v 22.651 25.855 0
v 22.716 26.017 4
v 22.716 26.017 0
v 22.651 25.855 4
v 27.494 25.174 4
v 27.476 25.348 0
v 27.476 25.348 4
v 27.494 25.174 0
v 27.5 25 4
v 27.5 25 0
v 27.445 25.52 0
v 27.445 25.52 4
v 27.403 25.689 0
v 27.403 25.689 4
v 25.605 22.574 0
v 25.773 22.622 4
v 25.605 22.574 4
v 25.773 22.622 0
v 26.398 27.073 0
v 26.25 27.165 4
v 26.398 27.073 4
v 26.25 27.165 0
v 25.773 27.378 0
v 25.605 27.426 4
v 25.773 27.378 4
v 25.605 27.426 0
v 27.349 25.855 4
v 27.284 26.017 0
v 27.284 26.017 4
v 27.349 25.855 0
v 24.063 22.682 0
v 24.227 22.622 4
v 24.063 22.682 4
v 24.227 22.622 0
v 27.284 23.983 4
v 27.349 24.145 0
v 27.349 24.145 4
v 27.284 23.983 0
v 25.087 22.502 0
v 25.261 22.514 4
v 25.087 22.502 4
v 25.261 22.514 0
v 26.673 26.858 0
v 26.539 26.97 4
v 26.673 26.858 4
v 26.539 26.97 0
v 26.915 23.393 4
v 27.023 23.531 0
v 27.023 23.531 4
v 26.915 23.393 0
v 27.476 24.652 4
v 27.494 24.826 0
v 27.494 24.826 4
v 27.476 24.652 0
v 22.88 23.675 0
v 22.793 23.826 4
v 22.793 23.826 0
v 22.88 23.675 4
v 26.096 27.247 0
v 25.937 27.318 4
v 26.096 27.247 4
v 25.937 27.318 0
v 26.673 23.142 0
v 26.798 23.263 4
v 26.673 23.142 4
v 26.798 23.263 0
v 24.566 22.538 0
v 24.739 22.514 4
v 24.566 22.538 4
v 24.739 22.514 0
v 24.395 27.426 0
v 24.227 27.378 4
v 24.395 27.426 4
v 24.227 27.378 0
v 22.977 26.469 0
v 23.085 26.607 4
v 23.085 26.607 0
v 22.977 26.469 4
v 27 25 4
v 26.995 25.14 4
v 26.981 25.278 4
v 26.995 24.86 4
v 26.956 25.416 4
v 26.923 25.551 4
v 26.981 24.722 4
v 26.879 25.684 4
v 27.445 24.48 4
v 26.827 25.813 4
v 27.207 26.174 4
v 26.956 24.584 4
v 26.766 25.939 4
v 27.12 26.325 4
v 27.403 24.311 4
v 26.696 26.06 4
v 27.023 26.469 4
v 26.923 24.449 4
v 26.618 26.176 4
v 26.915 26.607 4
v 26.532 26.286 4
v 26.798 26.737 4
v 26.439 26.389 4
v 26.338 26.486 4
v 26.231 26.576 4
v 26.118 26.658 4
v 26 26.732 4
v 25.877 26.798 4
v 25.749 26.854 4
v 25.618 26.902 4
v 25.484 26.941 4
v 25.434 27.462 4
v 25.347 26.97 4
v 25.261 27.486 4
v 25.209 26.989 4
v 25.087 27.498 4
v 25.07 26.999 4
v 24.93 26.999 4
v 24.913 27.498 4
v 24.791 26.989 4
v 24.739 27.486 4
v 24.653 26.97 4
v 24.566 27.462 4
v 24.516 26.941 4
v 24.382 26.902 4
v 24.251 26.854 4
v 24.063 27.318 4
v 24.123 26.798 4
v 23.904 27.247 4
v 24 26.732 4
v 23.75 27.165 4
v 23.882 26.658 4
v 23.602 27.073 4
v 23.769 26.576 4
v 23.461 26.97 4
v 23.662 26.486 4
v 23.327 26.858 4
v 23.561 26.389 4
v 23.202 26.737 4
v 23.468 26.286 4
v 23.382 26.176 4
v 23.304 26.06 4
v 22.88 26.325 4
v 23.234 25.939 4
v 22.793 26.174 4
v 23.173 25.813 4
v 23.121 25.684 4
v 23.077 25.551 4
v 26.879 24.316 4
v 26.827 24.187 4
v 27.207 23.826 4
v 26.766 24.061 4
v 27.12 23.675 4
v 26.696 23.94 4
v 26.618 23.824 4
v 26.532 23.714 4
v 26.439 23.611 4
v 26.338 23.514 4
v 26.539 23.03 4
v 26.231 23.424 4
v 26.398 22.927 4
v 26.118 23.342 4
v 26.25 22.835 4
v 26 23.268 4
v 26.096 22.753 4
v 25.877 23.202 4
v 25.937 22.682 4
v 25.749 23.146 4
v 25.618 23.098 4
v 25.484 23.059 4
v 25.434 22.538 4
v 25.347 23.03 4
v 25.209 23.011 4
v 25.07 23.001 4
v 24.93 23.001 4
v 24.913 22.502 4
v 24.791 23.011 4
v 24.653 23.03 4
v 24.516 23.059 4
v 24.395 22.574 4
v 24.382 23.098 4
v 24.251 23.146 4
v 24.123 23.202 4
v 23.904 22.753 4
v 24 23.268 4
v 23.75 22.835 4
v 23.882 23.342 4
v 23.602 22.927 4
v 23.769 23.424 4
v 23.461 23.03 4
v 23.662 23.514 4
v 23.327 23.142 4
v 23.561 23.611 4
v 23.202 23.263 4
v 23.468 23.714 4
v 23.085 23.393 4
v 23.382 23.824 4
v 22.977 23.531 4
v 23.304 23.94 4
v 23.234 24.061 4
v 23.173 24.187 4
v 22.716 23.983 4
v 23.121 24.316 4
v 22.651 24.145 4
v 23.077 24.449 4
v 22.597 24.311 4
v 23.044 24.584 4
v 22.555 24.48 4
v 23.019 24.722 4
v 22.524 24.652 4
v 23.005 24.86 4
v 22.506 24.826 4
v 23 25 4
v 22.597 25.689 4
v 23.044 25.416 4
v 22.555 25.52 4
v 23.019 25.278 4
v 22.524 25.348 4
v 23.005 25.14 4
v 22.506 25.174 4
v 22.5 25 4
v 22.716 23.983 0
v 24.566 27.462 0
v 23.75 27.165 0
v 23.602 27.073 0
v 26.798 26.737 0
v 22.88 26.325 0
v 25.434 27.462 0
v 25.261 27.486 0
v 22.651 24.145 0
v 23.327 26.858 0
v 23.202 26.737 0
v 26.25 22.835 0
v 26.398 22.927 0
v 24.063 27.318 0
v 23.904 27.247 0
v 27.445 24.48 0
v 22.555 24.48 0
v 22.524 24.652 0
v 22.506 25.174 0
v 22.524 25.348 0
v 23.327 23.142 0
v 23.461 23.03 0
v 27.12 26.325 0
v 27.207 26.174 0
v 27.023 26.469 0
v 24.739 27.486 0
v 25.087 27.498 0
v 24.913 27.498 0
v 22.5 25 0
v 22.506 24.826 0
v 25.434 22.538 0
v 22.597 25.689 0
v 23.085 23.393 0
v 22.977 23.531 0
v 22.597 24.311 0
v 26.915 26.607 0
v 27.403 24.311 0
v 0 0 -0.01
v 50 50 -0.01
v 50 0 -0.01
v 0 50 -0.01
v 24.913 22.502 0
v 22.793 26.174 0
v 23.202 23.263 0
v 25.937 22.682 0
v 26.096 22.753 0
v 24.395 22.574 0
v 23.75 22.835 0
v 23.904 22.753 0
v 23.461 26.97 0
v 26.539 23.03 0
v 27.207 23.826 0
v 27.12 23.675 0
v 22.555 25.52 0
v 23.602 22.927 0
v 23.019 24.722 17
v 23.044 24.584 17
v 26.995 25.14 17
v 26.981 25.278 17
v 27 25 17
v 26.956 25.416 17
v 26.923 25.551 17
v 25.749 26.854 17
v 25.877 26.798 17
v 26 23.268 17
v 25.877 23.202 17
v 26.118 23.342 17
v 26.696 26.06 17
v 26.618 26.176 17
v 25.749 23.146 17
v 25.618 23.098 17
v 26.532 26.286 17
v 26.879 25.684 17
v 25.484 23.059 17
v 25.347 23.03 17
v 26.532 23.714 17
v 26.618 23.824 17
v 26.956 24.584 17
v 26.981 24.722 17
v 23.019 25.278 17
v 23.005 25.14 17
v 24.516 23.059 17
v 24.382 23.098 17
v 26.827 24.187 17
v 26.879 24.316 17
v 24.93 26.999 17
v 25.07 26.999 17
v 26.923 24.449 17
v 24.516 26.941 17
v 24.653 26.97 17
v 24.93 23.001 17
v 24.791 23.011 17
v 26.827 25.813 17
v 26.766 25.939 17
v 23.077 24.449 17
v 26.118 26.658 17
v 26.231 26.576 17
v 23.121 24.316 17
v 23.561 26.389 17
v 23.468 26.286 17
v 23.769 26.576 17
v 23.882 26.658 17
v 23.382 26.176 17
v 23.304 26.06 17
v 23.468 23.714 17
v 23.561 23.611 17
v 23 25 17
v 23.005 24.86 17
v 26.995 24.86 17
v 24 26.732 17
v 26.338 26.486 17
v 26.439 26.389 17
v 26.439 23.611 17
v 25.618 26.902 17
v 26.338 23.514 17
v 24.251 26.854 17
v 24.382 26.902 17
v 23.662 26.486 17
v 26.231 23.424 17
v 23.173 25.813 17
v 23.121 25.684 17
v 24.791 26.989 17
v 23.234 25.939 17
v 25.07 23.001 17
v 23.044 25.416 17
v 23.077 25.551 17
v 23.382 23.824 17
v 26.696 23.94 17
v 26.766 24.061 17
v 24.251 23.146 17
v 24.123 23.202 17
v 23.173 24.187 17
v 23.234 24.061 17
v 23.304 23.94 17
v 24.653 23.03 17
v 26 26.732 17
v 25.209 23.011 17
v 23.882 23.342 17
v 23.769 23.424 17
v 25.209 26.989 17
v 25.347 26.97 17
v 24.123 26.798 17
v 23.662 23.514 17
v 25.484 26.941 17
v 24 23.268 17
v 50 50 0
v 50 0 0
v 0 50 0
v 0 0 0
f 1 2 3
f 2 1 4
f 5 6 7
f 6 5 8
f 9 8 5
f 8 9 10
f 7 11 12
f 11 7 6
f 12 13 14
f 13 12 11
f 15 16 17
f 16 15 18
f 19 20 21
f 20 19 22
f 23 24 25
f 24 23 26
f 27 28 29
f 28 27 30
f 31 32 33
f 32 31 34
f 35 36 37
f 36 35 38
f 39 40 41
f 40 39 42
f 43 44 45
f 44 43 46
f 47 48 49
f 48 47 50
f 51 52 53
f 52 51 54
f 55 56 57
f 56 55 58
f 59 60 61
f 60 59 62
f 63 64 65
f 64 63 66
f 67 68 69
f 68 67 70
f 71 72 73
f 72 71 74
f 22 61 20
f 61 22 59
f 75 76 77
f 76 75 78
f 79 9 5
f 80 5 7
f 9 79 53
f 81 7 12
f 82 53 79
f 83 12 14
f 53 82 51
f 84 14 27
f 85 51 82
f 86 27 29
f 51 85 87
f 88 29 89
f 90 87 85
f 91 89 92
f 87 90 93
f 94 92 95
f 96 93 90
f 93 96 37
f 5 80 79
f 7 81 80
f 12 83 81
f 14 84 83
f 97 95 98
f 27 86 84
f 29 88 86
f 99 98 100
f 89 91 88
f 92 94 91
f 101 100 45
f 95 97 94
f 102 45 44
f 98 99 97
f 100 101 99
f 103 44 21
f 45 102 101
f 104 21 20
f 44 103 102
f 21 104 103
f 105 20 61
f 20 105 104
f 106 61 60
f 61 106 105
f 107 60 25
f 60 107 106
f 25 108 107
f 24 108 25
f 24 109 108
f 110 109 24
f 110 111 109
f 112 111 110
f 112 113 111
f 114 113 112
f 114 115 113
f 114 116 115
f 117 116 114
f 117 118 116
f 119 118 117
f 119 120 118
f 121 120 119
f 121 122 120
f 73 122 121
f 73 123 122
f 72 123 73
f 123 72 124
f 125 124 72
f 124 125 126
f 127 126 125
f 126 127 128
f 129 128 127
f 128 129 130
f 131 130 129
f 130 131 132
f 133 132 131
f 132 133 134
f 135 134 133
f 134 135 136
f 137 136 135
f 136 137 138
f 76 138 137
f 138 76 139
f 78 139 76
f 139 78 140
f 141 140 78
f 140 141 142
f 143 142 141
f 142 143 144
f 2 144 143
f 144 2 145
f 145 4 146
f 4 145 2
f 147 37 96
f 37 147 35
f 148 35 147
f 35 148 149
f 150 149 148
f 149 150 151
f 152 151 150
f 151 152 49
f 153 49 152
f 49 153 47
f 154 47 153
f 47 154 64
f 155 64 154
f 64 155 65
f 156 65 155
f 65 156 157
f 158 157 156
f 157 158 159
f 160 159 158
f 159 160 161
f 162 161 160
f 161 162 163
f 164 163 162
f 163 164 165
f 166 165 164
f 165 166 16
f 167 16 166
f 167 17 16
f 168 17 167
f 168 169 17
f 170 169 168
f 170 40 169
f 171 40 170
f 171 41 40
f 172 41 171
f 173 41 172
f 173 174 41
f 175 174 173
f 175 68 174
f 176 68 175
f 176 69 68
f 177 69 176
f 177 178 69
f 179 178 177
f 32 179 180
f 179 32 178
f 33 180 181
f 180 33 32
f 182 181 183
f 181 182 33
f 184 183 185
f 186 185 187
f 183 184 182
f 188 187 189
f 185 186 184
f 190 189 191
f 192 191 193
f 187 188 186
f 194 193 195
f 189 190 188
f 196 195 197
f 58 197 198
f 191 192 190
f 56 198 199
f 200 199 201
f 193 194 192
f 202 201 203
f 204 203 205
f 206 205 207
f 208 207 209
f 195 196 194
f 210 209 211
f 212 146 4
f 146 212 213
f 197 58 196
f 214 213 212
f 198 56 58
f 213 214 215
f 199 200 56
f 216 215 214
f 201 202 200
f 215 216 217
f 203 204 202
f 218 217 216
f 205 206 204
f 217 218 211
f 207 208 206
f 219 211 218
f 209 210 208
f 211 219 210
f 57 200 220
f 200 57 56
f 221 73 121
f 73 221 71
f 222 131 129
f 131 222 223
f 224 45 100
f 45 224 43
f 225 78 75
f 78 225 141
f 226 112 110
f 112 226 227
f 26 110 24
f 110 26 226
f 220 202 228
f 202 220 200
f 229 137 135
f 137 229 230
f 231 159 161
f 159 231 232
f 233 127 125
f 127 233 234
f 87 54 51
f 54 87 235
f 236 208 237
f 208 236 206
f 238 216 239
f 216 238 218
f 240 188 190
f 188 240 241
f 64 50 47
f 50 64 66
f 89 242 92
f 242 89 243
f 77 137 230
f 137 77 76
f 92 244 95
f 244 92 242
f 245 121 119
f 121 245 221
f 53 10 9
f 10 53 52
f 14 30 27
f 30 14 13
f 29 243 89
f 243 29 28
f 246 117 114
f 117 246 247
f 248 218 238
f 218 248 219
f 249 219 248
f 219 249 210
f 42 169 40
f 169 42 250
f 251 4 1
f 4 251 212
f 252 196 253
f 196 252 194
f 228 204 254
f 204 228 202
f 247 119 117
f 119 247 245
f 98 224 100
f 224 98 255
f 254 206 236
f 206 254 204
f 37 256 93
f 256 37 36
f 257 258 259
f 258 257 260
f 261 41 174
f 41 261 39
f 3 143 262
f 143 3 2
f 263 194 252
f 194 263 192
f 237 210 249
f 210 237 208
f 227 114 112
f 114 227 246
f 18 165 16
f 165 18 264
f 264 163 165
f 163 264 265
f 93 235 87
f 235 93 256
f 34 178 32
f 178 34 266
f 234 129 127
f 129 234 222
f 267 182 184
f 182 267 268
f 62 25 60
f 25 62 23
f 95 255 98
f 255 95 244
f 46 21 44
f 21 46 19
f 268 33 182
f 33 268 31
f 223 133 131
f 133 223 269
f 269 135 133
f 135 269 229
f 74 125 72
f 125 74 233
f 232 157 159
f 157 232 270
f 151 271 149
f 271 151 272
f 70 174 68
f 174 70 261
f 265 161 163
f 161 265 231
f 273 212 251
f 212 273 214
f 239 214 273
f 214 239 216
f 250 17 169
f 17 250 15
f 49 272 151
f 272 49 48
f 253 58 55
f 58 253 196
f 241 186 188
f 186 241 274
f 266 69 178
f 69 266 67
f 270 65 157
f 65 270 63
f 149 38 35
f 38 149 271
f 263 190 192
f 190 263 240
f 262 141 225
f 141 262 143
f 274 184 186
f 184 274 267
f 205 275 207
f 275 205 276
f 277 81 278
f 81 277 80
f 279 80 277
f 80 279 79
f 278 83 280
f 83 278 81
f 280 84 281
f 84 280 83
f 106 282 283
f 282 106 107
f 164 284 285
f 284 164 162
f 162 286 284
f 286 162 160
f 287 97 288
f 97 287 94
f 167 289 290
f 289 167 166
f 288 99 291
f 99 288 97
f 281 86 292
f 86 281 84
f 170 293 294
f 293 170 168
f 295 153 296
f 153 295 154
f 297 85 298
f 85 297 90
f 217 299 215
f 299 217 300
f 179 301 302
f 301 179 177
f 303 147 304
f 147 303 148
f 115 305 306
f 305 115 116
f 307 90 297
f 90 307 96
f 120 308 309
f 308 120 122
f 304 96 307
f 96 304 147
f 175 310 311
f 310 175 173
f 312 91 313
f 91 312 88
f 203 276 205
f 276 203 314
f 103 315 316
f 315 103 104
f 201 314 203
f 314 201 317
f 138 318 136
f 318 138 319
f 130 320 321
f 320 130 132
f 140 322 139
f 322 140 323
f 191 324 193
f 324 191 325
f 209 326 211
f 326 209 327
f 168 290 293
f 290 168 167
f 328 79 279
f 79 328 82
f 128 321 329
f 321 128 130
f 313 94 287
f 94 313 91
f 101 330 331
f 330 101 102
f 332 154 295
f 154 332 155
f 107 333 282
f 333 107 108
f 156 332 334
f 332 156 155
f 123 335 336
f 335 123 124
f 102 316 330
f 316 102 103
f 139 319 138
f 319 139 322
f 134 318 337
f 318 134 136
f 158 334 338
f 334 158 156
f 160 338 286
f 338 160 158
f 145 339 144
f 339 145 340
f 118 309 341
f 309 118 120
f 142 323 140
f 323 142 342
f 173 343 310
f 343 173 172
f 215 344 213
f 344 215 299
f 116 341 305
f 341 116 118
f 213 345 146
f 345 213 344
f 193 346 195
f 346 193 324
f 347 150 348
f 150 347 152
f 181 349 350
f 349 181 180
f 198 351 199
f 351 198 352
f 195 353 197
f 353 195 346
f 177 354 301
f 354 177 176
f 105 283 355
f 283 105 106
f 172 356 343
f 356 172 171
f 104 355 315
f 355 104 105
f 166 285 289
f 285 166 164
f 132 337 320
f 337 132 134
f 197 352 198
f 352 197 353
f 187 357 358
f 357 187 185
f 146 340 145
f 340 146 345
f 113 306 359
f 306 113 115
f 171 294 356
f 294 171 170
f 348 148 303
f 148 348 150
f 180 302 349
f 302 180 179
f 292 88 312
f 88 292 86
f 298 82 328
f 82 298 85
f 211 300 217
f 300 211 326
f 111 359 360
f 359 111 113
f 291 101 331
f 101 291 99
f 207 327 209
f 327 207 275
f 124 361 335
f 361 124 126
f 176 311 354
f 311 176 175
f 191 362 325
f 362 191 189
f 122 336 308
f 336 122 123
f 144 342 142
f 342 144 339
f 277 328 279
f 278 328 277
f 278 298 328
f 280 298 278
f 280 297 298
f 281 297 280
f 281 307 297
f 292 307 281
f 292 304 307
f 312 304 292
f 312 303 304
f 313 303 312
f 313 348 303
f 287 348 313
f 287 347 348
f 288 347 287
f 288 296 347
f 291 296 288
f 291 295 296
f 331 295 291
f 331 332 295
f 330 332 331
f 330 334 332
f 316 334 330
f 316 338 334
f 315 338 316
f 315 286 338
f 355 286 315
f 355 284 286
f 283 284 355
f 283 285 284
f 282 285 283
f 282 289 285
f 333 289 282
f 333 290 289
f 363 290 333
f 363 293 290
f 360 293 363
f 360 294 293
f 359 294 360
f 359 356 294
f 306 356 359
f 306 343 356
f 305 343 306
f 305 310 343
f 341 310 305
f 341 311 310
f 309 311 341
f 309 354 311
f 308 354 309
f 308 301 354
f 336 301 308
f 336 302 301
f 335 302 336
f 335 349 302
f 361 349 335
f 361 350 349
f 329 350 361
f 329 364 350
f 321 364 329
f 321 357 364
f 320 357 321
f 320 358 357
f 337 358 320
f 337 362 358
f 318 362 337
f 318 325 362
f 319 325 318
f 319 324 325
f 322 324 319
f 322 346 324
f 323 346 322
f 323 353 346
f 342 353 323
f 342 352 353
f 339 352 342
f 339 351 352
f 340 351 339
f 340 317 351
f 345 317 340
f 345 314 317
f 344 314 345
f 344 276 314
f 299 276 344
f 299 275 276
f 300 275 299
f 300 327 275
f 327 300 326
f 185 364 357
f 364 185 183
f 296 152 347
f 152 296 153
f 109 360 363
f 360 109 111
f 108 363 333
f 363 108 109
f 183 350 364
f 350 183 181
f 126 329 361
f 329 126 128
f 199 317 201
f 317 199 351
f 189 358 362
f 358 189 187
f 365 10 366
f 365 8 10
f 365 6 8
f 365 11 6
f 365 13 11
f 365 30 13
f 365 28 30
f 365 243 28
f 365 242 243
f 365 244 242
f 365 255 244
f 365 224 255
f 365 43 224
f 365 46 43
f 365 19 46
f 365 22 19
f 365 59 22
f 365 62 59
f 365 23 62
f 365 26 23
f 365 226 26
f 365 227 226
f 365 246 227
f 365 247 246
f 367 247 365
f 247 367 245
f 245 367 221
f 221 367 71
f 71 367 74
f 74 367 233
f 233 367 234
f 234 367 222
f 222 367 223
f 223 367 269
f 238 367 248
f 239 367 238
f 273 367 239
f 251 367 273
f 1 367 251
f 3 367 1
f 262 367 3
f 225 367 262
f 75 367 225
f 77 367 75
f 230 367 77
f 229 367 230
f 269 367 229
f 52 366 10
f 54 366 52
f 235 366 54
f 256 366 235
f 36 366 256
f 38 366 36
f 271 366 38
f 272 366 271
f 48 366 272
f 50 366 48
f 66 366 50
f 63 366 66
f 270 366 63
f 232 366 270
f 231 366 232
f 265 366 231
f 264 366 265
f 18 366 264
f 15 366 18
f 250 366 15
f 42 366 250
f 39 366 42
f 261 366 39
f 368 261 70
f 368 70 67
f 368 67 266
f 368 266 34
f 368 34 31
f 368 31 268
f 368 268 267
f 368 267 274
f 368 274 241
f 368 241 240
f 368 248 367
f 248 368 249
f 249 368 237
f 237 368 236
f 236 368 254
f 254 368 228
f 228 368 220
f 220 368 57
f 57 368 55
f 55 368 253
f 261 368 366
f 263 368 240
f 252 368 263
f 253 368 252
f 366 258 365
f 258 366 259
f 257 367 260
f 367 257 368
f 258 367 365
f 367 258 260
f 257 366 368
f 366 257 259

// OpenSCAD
// file: ../Base/PlacementOptions.scad
// Fischertechnik Box Foundation
// Placement Options

// Alignment
NoAlign = 0;
AlignLeft = 1;
AlignBottom = 2;
AlignCenter = 3;
AlignRight = 4;
AlignTop = 5;

// Element rotation degree steps
rotations = [0, -90, -180, -270];

// Rotation
NoRotation = 0;
Rotate0 = 0;
Rotate90 = 1;
Rotate180 = 2;
Rotate270 = 3;

// Docking (seen from above)
NoDock = -1;
DockLeft = 0;
DockTop = 1;
DockRight = 2;
DockCorner = 2;
DockBottom = 3;

// Web corners
LowerLeft = 0;
UpperLeft = 1;
UpperRight = 2;
LowerRight = 3;

// Web position relative to corner
LeftOfCorner = 0;
RightOfCorner = 1;
// file: ../Base/Boxes.scad
// Fischertechnik Box Foundation
// Pre-designed Boxes

use <Constants.scad>

include <PlacementOptions.scad>

box190Width = 190;
box190Depth = 130;
box130Width = 130;
box130Depth = 95;
boxUsageHeight = 33.9;
boxWallThickness = 2.4;
boxBaseThickness = 1.0;
boxWebWidth = 3.0;

// getBoxWallThickness()
// Gets the wall thickness of a Fischertechnik Box

function getBoxWallThickness() = boxWallThickness;

// Gets the usable height of a fischertechnik box
function getBoxUsageHeight() = boxUsageHeight;

// Gets the thickness of the Fischertechnik box base.
function getBoxBaseThickness() = boxBaseThickness;

// Gets the width of a box web
function getBoxWebWidth() = boxWebWidth;

// Gets the usable inner space of a Box 190 as an x/y-list
function getBox190Space() = [
    box190Width - 2*getBoxWallThickness(), 
    box190Depth - 2*getBoxWallThickness() ];

// Imports the Fischertechnik empty box 130x190 mm and places it at position 0,0
// 190x130 are the outer sizes, the inner space is slightly smaller. Use getBox190Space() to get the inner sizes.
// This module needs the STL file "Fischertechnik Box 130x190.stl" in the library path.
// The box is positioned that the usable inner space is at the 0,0,0 position. The

module Box190() {
    translate([-getBoxWallThickness(),-getBoxWallThickness(),-getBoxBaseThickness()])
        import("Fischertechnik Box 130x190.stl", convexity=3);
}

// Gets the usable inner space of a Box 130 as an x/y-list
function getBox130Space() = [
    box130Width - 2*getBoxWallThickness(), 
    box130Depth - 2*getBoxWallThickness() ];

// Imports the Fischertechnik empty box 95x130 mm and places it at position 0,0
// 190x130 are the outer sizes, the inner space is slightly smaller. Use getBox190Space() to get the inner sizes.
// This module needs the STL file "Fischertechnik Box 95x130.stl" in the library path.
// The box is positioned that the usable inner space is at the 0,0,0 position. The

module Box130() {
    translate([-getBoxWallThickness(),-getBoxWallThickness(),-getBoxBaseThickness()])
        import("Fischertechnik Box 95x130.stl", convexity=3);
}

// Creates a web at the specified box walls
// corner 0 = LowerLeft, 1 = UpperLeft, 2 = UpperRight, 3 = LowerRight
// side 0 = LeftOfCorner, 1 = RightOfCorner
// distance = Distance in mm from the corner
// box = inner width and depth of the box (default: Box 190)
// webWidth = length of the web (default is 3 mms)
// webThickness = thickness of the web (default is 1 mm)

module BoxWeb(corner, side, distance, box=getBox190Space(), webWidth=getBoxWebWidth(), webThickness=1.0) {
    sink = getBoxWallThickness()/2;

    width = (corner % 2 == 0) ? 
            (side == LeftOfCorner ? webWidth : webThickness) :
            (side == LeftOfCorner ? webThickness : webWidth);

    depth = (corner % 2 == 0) ? 
            (side == RightOfCorner ? webWidth : webThickness) :
            (side == RightOfCorner ? webThickness : webWidth);
    
    xDiff = corner == LowerLeft ? 
                (side == LeftOfCorner ? -sink : distance) :
            (corner == UpperLeft ?                
                (side == LeftOfCorner ? distance : -sink) :
            (corner == UpperRight ?
                (side == LeftOfCorner ? box.x-webWidth+sink : box.x-distance-webThickness) :
                (side == LeftOfCorner ? box.x-distance-webThickness: box.x-webWidth+sink)));

    yDiff = corner == LowerLeft ? 
                (side == RightOfCorner ? -sink : distance) :
            (corner == UpperLeft ?
                (side == RightOfCorner ? box.y-distance : box.y-webWidth+sink) :
            (corner == UpperRight ?
                (side == RightOfCorner ? box.y-webWidth+sink : box.y-distance) :
                (side == RightOfCorner ? distance : -sink)));
    
    translate([xDiff, yDiff, -getExcess()])
        cube([width, depth, boxUsageHeight + 2*getExcess()]);
}
// file: ../Base/Rotation.scad
// Fischertechnik Box Foundation
// Geometry Helpers Rotation

include <PlacementOptions.scad>

// getRotatedSpace(space, rotation=NoRotation)
// Rotates the space dependent on the specified rotation

function getRotatedSpace(space, rotation=NoRotation) = [
    (rotation == Rotate90 || rotation == Rotate270) ? space.y : space.x,
    (rotation == Rotate90 || rotation == Rotate270) ? space.x : space.y
];

// Rotates the given space around the fixed left lower corner
// space = the space the children needs as width/depth list [width,depth]
// rotation = 0 Rotate0 degrees, 1 Rotate90 degrees, 2 Rotate180 degrees, 3 Rotate270 degrees (equivalent to -90)

module RotateFix(space, rotation=Rotate0) {
    dy = (rotation == Rotate0 || rotation == Rotate270) ? 0 :
        (rotation == Rotate90) ? space.x :
        space.y;
    dx = (rotation < Rotate180) ? 0 :
        (rotation == Rotate180) ? space.x :
        space.y;
    
    translate([dx, dy, 0])
        rotate([0, 0, rotations[rotation]])
            children();
}
// file: ../Base/Alignment.scad
// Fischertechnik Box Foundation
// Geometry Helpers Alignment

include <PlacementOptions.scad>

// getAlignedX(elementWidth, spaceWidth, align=AlignRight, offset=0)
// Gets the aligned X offset of an element with the given
// width in the given space.
// elementWidth = The width of the element to positon
// spaceWidth = The space where the element should be aligned
// align = 0 AlignLeft, 1 AlignCenter, 2 AlignRight
// offset = an optional offset from the aligned position. When
// aligned left or centered, then positive values are in X direction.
// When aligned right then positive values are in negative X direction.

function getAlignedX(elementWidth, spaceWidth, align=AlignRight, offset=0) =
    (align == AlignLeft) ?
        offset :
        ((align == AlignCenter) ?
        (spaceWidth - elementWidth)/2 + offset :
        spaceWidth - offset - elementWidth);

// getAlignedY(elementDepth, spaceDepth, align=AlignTop, offset=0)
// Gets the aligned Y offset of an element with the given
// depth in the given space.
// elementDepth = The depth of the element to positon
// spaceDepth = The space where the element should be aligned
// align = 0 AlignBottom, 1 AlignCenter, 2 AlignTop
// offset = an optional offset from the aligned position. When
// aligned bottom or centered, then positive values are in Y direction.
// When aligned top then positive values are in negative Y direction.

function getAlignedY(elementDepth, spaceDepth, align=AlignTop, offset=0) =
    (align == AlignBottom) ?
        offset :
        ((align == AlignCenter) ?
        (spaceDepth - elementDepth)/2 + offset :
        spaceDepth - offset - elementDepth);
// file: CylinderHub.scad
// Fischertechnik Box Library
// Cylinder and axis for hub 
// 31014

use <../Base/Constants.scad>
use <../Base/Placement.scad>
use <../ModelBase/Simple.scad>

width = 28;
depth = 28;

// getCylinderHub()
// Gets the space the cylinder for a hub needs as width and depth (.x and .y as a list)

function getCylinderHubSpace() = [width, depth];

// CylinderHub()
// Standing cylinder and axis for a hub.
// 31014

module CylinderHub() {
    diameter = 23;
    height = 4;
    axisHeight = 17;
    outerDiameter = diameter + getTubeWallThickness();

    Space(getCylinderHubSpace());
        
    Center(getCylinderHubSpace()) {
        LeveledAxis(axisHeight, height);
        Tube(height, outerDiameter);
    }
}

// Tests
color("lightgray")
CylinderHub();
// file: ../Base/Placement.scad
// Fischertechnik Box Foundation
// Geometry Helpers Placement

use <Constants.scad>
use <Alignment.scad>
use <Rotation.scad>
use <Boxes.scad>

include <PlacementOptions.scad>

// Place(x=0, y=0, elementSpace=[0,0], alignX=AlignLeft, alignY=AlignBottom, rotation=Rotate0, boxSpace=getBox190Space())
// Places the child at the specified position
// y = Y-Position. This is a relative position when an X aligment is specified.
// x = X-Position. This is a relative position when an Y aligment is specified.
// elementSpace = space of the element to be placed [x,y]
// alignX = -1=NoAlign, 0 AlignLeft, 1 AlignCenter, 3 AlignRight (elementSpace and boxSpace required!)
// alignY = -1=NoAlign, 2 AlignBottom, 1 AlignCenter, 4 AlignTop (elementSpace and boxSpace required!)
// rotation = 0 Rotate0 0 degrees, 1 Rotate90 90 degrees, 
// 2 Rotate180 180 degrees, 3 Rotate270 270 degrees (equivalent to -90)
// boxSpace = Inner space of the box where the placement occurs [x,y] - default is Box 190x130 inner space

module Place(x=0, y=0, elementSpace=[0,0], 
  alignX=AlignLeft, alignY=AlignBottom, 
  rotation=NoRotation, boxSpace=getBox190Space()) {

    module Position(x, y, space, rotation=Rotate0) {
        translate([x, y, 0])
            RotateFix(space, rotation)
                children();
    }

    space = getRotatedSpace(elementSpace, rotation);
    alignedX = getAlignedX(space.x, boxSpace.x, alignX, x);
    alignedY = getAlignedY(space.y, boxSpace.y, alignY, y);
    Position(alignedX, alignedY, elementSpace, rotation)
        children();
}

// Center(space=getBox130Space(), elementSpace=[0,0])
// space = Space where the children is centered. For cylinder use centered=true and no elementSpace.
// elementSpace = space of the element to be centered [x,y]

module Center(space=getBox190Space(), elementSpace=[0,0]) {
    translate([(space.x - elementSpace.x) / 2, (space.y - elementSpace.y) / 2])
        children(0);
}

// CenterHorizontal(width=0, y=0, offset=0, space=getBox130Space())
// space = Space where the children is centered. For cylinder use centered=true and no elementSpace.
// elementSpace = space of the element to be centered [x,y]

module CenterHorizontal(width=0, y=0, offset=0, space=getBox190Space()) {
    translate([(space.x - width) / 2 + offset, y])
        children(0);
}

// CenterVertical(depth=0, x=0, offset=0, space=getBox130Space())
// space = Space where the children is centered. For cylinder use centered=true and no elementSpace.
// elementSpace = space of the element to be centered [x,y]

module CenterVertical(depth=0, x=0, offset=0, space=getBox190Space()) {
    translate([x, (space.y - depth) / 2 + offset])
        children(0);
}
// file: ../Base/Constants.scad
// Fischertechnik Box Foundation
// Constants

// Constant values necessary for multiple elements

// Base constants
dividerThickness = 1.2;
excess = 0.01;
fragments = 90;
tolerance = 0.8;

// Gets the thickness of a divider 
function getDividerThickness() = dividerThickness;

// Gets the excess that is used to merge walls into each other
function getExcess() = excess;

// Gets amount of fragments of a cylinder
function getFragments() = fragments;

// Gets the inner tolerance of a frame to each side
function getTolerance() = tolerance;


// Fischertechnik specific constants
axisDiameter = 4;
axisBottomDiameter = axisDiameter + 1;
standardEdgeDistance = 2.5;
standardWebDistance = 11.5;
standardCornerLength = 15;
tubeWallFactor = 1.6;

// Gets axis diameter
function getAxisDiameter() = axisDiameter;

// Gets axis bottom diameter for thicker part at the bottom
function getAxisBottomDiameter() = axisBottomDiameter;

// gets the standard distance to the wall of the box for dockable frames with webs
function getStandardEdgeDistance() = standardEdgeDistance;

// gets the standard distance of each web to the corner of the dockable frame
function getStandardWebDistance() = standardWebDistance;

// gets the standard length of the corner walls of a dockable frame
function getStandardCornerLength() = standardCornerLength;

// gets the wall thickness of a tube.
function getTubeWallThickness() = tubeWallFactor * getDividerThickness();
// main file
// Fischertechnik Box Library
// Cylinder and axis for hub with gear wheel Z30
// 31014 and 36264

use <../Base/Constants.scad>
use <../Base/Placement.scad>
use <../ModelBase/Simple.scad>

use <CylinderHub.scad>

width = 50;
depth = 50;

// getCylinderHubWithZ30()
// Gets the space the cylinder for a hub with a Z30 needs as width and depth (.x and .y as a list)

function getCylinderHubWithZ30Space() = [width, depth];

// CylinderHub()
// Standing cylinder and axis for a hub with Z30.
// 31014 and 36264

module CylinderHubWithZ30() {
    Space(getCylinderHubWithZ30Space());
        
    Center(elementSpace=getCylinderHubSpace(), space=getCylinderHubWithZ30Space())
        CylinderHub();
}

// Tests
color("lightgray")
CylinderHubWithZ30();
